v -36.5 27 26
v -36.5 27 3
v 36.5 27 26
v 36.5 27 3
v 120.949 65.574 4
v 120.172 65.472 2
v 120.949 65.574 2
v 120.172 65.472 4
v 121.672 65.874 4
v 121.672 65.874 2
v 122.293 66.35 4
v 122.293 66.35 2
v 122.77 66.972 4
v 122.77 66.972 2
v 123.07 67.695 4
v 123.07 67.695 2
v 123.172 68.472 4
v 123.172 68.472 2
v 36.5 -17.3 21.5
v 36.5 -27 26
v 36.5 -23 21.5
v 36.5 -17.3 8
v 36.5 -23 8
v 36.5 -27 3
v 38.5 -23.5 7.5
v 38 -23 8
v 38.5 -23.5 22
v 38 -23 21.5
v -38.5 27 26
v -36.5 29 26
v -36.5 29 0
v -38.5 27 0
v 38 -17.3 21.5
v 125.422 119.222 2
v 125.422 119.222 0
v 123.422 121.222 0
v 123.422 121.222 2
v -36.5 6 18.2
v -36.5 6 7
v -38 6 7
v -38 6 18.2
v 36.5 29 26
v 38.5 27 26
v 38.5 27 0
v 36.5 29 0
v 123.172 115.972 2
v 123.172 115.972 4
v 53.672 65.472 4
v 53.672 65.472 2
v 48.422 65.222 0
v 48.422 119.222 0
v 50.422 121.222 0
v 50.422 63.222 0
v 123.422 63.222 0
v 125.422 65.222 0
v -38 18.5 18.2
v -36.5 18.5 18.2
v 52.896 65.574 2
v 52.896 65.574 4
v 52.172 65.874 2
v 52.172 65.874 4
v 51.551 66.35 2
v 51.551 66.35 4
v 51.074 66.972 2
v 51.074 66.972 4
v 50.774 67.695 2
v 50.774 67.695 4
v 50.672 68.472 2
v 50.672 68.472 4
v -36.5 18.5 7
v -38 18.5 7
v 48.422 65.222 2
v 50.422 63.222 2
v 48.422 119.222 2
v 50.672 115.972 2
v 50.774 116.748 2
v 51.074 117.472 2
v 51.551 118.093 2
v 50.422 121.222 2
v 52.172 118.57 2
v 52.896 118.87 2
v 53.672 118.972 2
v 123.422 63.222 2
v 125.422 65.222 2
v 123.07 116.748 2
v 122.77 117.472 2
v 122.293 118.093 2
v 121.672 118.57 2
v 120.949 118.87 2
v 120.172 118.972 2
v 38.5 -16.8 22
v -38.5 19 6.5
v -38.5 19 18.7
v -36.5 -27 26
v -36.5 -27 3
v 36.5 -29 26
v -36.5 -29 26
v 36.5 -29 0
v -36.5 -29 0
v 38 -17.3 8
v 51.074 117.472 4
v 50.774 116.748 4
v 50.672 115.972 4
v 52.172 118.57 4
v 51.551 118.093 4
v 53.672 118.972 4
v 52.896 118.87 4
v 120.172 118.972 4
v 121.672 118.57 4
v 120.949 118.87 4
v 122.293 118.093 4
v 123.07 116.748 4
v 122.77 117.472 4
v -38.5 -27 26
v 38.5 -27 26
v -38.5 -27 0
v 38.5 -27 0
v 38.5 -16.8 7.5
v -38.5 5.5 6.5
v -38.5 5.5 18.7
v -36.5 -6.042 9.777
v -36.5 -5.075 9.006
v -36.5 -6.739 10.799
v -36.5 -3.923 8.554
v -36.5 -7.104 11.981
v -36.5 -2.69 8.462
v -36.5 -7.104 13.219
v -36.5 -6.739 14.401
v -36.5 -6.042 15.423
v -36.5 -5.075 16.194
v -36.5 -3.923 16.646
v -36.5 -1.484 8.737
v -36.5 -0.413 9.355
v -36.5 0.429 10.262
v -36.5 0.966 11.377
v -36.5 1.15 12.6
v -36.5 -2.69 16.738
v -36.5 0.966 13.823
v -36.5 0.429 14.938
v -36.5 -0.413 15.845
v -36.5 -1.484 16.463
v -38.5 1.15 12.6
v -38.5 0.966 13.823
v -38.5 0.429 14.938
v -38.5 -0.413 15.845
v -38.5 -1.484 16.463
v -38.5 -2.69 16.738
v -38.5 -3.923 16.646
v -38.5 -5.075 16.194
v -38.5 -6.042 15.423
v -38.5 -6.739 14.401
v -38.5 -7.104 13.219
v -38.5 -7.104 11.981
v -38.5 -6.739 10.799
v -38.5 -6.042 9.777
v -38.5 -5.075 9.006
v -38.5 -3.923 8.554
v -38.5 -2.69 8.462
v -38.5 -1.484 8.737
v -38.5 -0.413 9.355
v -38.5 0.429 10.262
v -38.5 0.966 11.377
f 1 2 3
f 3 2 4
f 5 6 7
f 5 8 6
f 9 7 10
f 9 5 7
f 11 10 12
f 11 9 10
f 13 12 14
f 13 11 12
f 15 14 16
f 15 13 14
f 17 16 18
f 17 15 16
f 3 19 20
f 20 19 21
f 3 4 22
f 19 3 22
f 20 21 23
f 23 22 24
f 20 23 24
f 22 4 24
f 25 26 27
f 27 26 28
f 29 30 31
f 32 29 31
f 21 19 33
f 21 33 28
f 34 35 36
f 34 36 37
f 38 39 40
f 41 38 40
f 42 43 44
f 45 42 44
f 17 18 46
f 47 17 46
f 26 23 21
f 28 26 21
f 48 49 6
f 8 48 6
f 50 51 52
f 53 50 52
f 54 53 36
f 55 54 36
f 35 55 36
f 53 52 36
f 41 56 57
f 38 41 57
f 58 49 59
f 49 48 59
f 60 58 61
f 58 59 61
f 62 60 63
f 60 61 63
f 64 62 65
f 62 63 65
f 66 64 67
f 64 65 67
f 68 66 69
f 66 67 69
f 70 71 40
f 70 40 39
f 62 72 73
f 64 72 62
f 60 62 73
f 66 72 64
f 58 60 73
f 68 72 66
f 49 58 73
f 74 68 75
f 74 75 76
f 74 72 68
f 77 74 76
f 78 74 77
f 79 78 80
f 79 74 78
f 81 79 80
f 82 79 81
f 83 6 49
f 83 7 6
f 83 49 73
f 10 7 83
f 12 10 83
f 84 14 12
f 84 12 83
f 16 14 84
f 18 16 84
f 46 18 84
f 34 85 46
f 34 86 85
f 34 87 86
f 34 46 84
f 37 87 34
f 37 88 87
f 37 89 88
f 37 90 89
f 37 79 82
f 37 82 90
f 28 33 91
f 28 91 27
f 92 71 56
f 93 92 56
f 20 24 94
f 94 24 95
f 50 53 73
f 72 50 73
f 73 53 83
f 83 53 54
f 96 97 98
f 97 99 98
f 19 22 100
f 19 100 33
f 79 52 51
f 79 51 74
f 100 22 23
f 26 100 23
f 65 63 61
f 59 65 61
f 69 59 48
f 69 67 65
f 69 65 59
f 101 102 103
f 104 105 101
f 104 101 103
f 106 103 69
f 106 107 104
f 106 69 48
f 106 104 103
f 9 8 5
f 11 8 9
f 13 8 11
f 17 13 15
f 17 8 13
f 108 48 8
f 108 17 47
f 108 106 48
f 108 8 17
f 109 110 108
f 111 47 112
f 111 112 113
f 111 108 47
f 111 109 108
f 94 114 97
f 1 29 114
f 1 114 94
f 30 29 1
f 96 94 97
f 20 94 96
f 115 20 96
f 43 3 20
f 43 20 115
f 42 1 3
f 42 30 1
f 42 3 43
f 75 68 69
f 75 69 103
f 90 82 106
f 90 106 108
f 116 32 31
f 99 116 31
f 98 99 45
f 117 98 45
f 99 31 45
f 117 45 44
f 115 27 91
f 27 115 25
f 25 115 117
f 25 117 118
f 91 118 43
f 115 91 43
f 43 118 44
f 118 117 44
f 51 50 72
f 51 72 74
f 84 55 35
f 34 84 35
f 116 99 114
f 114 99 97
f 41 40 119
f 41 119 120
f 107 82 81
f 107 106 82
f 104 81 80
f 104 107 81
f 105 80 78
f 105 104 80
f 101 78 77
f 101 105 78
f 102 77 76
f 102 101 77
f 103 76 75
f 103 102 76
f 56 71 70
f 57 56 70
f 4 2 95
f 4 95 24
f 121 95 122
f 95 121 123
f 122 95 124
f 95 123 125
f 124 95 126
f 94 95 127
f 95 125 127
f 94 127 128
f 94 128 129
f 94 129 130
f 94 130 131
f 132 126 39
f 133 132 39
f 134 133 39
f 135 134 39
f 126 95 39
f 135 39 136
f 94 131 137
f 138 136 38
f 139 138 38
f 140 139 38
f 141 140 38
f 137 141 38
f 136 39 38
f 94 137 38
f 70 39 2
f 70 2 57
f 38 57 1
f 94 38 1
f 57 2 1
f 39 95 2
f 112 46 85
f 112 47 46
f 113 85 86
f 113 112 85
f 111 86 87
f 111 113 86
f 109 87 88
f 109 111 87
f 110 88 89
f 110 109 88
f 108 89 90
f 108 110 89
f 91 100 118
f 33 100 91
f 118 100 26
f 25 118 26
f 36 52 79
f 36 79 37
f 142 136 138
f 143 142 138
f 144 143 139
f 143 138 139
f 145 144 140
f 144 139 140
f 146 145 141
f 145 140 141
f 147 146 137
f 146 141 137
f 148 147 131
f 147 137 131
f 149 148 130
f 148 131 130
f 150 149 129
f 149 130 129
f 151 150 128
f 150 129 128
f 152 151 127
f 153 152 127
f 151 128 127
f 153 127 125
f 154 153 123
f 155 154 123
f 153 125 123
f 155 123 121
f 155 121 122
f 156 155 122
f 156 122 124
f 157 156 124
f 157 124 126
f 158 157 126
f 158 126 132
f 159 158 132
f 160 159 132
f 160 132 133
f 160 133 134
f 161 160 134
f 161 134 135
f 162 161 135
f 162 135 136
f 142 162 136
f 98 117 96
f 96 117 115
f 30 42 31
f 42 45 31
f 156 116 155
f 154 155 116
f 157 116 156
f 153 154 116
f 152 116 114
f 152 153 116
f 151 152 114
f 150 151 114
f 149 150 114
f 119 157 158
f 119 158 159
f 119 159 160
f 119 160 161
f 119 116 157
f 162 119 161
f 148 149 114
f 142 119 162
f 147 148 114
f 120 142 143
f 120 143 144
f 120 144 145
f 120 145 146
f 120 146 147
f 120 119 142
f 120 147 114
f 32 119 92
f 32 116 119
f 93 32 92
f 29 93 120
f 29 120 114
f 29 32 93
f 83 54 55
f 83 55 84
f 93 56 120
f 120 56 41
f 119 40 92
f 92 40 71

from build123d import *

# Parameters (mm, degrees)
F0_W      = 77
F0_H      = 58
F1_DEPTH  = 3
F2_W      = 77
F2_H      = 58
F2_W_2    = 73
F2_H_2    = 54
F3_DEPTH  = 4
F5_DEPTH  = 19
F6_W      = 2
F6_H      = 7.8
F7_DEPTH  = 25
F9_D      = 8.3
F9_DEPTH  = 10
F9_TIP    = 2.493571569
F10_W     = 5.7
F10_H     = 13.5
F11_DEPTH = 25
F12_SIZE  = 2
F13_SIZE  = 0.5
F14_SIZE  = 0.5
F15_W     = 77
F15_H     = 58
F16_DEPTH = 2
F17_W     = 72.5
F17_H     = 53.5
F18_DEPTH = 2
F19_R     = 3
F20_SIZE  = 2


with BuildPart() as f1:
    # F0 (on Top) → F1 (new body)
    with BuildSketch(Plane.XY):
        Rectangle(F0_W, F0_H)
    extrude(amount=F1_DEPTH)

    # F2 (on face) → F3 (join)
    with BuildSketch(Plane.XY.offset(3)):
        Rectangle(F2_W, F2_H)
        Rectangle(F2_W_2, F2_H_2, mode=Mode.SUBTRACT)
    extrude(amount=F3_DEPTH)

    # F4 (on face) → F5 (join)
    with BuildSketch(Plane.XY.offset(7)):
        Polygon((-38.5, 18.5), (-36.5, 18.5), (-36.5, 27), (36.5, 27), (36.5, -27), (-36.5, -27), (-36.5, 6), (-38.5, 6), (-38.5, -29), (38.5, -29), (38.5, 29), (-38.5, 29), align=None)
    extrude(amount=F5_DEPTH)

    # F6 (on face) → F7 (join)
    with BuildSketch(Plane.XZ.offset(-18.5)):
        with Locations((-37.5, 22.1)):
            Rectangle(F6_W, F6_H)
    extrude(amount=F7_DEPTH)

    # F9
    with Locations(Plane(origin=(-38.5, 0, 0), x_dir=(0, -1, 0), z_dir=(-1, 0, 0))):
        with Locations((3, 12.6)):
            Hole(F9_D / 2, depth=F9_DEPTH)
            with Locations((0, 0, -(F9_DEPTH + F9_TIP / 2))):  # 118° drill point
                Cone(0, F9_D / 2, F9_TIP, mode=Mode.SUBTRACT)

    # F10 (on face) → F11 (cut)
    with BuildSketch(Plane(origin=(36.5, 0, 0), x_dir=(0, -1, 0), z_dir=(-1, 0, 0))):
        with Locations((20.15, 14.75)):
            Rectangle(F10_W, F10_H)
    extrude(amount=-F11_DEPTH, mode=Mode.SUBTRACT)

    # F12
    f12_edges = [f1.edges().sort_by_distance(p)[0] for p in [
        (-38.5, -29, 13),
        (38.5, -29, 13),
        (38.5, 29, 13),
        (-38.5, 29, 13),
    ]]
    chamfer(f12_edges, length=F12_SIZE)

    # F13
    f13_edges = [f1.edges().sort_by_distance(p)[0] for p in [
        (38.5, -17.3, 14.75),
        (38.5, -20.15, 21.5),
        (38.5, -23, 14.75),
        (38.5, -20.15, 8),
    ]]
    chamfer(f13_edges, length=F13_SIZE)

    # F14
    f14_edges = [f1.edges().sort_by_distance(p)[0] for p in [
        (-38.5, 18.5, 12.6),
        (-38.5, 12.25, 18.2),
        (-38.5, 6, 12.6),
        (-38.5, 12.25, 7),
    ]]
    chamfer(f14_edges, length=F14_SIZE)


with BuildPart() as f16:
    # F15 (on Top) → F16 (new body)
    with BuildSketch(Plane.XY):
        with Locations((86.9221650064, 92.2217702333)):
            Rectangle(F15_W, F15_H)
    extrude(amount=F16_DEPTH)

    # F17 (on face) → F18 (join)
    with BuildSketch(Plane.XY.offset(2)):
        with Locations((86.9221650064, 92.2217702333)):
            Rectangle(F17_W, F17_H)
    extrude(amount=F18_DEPTH)

    # F19
    f19_edges = [f16.edges().sort_by_distance(p)[0] for p in [
        (123.172165, 65.47177, 3),
        (50.672165, 65.47177, 3),
        (50.672165, 118.97177, 3),
        (123.172165, 118.97177, 3),
    ]]
    fillet(f19_edges, radius=F19_R)

    # F20
    f20_edges = [f16.edges().sort_by_distance(p)[0] for p in [
        (48.422165, 121.22177, 1),
        (125.422165, 121.22177, 1),
        (125.422165, 63.22177, 1),
        (48.422165, 63.22177, 1),
    ]]
    chamfer(f20_edges, length=F20_SIZE)


solid = Compound([f1.part, f16.part])
